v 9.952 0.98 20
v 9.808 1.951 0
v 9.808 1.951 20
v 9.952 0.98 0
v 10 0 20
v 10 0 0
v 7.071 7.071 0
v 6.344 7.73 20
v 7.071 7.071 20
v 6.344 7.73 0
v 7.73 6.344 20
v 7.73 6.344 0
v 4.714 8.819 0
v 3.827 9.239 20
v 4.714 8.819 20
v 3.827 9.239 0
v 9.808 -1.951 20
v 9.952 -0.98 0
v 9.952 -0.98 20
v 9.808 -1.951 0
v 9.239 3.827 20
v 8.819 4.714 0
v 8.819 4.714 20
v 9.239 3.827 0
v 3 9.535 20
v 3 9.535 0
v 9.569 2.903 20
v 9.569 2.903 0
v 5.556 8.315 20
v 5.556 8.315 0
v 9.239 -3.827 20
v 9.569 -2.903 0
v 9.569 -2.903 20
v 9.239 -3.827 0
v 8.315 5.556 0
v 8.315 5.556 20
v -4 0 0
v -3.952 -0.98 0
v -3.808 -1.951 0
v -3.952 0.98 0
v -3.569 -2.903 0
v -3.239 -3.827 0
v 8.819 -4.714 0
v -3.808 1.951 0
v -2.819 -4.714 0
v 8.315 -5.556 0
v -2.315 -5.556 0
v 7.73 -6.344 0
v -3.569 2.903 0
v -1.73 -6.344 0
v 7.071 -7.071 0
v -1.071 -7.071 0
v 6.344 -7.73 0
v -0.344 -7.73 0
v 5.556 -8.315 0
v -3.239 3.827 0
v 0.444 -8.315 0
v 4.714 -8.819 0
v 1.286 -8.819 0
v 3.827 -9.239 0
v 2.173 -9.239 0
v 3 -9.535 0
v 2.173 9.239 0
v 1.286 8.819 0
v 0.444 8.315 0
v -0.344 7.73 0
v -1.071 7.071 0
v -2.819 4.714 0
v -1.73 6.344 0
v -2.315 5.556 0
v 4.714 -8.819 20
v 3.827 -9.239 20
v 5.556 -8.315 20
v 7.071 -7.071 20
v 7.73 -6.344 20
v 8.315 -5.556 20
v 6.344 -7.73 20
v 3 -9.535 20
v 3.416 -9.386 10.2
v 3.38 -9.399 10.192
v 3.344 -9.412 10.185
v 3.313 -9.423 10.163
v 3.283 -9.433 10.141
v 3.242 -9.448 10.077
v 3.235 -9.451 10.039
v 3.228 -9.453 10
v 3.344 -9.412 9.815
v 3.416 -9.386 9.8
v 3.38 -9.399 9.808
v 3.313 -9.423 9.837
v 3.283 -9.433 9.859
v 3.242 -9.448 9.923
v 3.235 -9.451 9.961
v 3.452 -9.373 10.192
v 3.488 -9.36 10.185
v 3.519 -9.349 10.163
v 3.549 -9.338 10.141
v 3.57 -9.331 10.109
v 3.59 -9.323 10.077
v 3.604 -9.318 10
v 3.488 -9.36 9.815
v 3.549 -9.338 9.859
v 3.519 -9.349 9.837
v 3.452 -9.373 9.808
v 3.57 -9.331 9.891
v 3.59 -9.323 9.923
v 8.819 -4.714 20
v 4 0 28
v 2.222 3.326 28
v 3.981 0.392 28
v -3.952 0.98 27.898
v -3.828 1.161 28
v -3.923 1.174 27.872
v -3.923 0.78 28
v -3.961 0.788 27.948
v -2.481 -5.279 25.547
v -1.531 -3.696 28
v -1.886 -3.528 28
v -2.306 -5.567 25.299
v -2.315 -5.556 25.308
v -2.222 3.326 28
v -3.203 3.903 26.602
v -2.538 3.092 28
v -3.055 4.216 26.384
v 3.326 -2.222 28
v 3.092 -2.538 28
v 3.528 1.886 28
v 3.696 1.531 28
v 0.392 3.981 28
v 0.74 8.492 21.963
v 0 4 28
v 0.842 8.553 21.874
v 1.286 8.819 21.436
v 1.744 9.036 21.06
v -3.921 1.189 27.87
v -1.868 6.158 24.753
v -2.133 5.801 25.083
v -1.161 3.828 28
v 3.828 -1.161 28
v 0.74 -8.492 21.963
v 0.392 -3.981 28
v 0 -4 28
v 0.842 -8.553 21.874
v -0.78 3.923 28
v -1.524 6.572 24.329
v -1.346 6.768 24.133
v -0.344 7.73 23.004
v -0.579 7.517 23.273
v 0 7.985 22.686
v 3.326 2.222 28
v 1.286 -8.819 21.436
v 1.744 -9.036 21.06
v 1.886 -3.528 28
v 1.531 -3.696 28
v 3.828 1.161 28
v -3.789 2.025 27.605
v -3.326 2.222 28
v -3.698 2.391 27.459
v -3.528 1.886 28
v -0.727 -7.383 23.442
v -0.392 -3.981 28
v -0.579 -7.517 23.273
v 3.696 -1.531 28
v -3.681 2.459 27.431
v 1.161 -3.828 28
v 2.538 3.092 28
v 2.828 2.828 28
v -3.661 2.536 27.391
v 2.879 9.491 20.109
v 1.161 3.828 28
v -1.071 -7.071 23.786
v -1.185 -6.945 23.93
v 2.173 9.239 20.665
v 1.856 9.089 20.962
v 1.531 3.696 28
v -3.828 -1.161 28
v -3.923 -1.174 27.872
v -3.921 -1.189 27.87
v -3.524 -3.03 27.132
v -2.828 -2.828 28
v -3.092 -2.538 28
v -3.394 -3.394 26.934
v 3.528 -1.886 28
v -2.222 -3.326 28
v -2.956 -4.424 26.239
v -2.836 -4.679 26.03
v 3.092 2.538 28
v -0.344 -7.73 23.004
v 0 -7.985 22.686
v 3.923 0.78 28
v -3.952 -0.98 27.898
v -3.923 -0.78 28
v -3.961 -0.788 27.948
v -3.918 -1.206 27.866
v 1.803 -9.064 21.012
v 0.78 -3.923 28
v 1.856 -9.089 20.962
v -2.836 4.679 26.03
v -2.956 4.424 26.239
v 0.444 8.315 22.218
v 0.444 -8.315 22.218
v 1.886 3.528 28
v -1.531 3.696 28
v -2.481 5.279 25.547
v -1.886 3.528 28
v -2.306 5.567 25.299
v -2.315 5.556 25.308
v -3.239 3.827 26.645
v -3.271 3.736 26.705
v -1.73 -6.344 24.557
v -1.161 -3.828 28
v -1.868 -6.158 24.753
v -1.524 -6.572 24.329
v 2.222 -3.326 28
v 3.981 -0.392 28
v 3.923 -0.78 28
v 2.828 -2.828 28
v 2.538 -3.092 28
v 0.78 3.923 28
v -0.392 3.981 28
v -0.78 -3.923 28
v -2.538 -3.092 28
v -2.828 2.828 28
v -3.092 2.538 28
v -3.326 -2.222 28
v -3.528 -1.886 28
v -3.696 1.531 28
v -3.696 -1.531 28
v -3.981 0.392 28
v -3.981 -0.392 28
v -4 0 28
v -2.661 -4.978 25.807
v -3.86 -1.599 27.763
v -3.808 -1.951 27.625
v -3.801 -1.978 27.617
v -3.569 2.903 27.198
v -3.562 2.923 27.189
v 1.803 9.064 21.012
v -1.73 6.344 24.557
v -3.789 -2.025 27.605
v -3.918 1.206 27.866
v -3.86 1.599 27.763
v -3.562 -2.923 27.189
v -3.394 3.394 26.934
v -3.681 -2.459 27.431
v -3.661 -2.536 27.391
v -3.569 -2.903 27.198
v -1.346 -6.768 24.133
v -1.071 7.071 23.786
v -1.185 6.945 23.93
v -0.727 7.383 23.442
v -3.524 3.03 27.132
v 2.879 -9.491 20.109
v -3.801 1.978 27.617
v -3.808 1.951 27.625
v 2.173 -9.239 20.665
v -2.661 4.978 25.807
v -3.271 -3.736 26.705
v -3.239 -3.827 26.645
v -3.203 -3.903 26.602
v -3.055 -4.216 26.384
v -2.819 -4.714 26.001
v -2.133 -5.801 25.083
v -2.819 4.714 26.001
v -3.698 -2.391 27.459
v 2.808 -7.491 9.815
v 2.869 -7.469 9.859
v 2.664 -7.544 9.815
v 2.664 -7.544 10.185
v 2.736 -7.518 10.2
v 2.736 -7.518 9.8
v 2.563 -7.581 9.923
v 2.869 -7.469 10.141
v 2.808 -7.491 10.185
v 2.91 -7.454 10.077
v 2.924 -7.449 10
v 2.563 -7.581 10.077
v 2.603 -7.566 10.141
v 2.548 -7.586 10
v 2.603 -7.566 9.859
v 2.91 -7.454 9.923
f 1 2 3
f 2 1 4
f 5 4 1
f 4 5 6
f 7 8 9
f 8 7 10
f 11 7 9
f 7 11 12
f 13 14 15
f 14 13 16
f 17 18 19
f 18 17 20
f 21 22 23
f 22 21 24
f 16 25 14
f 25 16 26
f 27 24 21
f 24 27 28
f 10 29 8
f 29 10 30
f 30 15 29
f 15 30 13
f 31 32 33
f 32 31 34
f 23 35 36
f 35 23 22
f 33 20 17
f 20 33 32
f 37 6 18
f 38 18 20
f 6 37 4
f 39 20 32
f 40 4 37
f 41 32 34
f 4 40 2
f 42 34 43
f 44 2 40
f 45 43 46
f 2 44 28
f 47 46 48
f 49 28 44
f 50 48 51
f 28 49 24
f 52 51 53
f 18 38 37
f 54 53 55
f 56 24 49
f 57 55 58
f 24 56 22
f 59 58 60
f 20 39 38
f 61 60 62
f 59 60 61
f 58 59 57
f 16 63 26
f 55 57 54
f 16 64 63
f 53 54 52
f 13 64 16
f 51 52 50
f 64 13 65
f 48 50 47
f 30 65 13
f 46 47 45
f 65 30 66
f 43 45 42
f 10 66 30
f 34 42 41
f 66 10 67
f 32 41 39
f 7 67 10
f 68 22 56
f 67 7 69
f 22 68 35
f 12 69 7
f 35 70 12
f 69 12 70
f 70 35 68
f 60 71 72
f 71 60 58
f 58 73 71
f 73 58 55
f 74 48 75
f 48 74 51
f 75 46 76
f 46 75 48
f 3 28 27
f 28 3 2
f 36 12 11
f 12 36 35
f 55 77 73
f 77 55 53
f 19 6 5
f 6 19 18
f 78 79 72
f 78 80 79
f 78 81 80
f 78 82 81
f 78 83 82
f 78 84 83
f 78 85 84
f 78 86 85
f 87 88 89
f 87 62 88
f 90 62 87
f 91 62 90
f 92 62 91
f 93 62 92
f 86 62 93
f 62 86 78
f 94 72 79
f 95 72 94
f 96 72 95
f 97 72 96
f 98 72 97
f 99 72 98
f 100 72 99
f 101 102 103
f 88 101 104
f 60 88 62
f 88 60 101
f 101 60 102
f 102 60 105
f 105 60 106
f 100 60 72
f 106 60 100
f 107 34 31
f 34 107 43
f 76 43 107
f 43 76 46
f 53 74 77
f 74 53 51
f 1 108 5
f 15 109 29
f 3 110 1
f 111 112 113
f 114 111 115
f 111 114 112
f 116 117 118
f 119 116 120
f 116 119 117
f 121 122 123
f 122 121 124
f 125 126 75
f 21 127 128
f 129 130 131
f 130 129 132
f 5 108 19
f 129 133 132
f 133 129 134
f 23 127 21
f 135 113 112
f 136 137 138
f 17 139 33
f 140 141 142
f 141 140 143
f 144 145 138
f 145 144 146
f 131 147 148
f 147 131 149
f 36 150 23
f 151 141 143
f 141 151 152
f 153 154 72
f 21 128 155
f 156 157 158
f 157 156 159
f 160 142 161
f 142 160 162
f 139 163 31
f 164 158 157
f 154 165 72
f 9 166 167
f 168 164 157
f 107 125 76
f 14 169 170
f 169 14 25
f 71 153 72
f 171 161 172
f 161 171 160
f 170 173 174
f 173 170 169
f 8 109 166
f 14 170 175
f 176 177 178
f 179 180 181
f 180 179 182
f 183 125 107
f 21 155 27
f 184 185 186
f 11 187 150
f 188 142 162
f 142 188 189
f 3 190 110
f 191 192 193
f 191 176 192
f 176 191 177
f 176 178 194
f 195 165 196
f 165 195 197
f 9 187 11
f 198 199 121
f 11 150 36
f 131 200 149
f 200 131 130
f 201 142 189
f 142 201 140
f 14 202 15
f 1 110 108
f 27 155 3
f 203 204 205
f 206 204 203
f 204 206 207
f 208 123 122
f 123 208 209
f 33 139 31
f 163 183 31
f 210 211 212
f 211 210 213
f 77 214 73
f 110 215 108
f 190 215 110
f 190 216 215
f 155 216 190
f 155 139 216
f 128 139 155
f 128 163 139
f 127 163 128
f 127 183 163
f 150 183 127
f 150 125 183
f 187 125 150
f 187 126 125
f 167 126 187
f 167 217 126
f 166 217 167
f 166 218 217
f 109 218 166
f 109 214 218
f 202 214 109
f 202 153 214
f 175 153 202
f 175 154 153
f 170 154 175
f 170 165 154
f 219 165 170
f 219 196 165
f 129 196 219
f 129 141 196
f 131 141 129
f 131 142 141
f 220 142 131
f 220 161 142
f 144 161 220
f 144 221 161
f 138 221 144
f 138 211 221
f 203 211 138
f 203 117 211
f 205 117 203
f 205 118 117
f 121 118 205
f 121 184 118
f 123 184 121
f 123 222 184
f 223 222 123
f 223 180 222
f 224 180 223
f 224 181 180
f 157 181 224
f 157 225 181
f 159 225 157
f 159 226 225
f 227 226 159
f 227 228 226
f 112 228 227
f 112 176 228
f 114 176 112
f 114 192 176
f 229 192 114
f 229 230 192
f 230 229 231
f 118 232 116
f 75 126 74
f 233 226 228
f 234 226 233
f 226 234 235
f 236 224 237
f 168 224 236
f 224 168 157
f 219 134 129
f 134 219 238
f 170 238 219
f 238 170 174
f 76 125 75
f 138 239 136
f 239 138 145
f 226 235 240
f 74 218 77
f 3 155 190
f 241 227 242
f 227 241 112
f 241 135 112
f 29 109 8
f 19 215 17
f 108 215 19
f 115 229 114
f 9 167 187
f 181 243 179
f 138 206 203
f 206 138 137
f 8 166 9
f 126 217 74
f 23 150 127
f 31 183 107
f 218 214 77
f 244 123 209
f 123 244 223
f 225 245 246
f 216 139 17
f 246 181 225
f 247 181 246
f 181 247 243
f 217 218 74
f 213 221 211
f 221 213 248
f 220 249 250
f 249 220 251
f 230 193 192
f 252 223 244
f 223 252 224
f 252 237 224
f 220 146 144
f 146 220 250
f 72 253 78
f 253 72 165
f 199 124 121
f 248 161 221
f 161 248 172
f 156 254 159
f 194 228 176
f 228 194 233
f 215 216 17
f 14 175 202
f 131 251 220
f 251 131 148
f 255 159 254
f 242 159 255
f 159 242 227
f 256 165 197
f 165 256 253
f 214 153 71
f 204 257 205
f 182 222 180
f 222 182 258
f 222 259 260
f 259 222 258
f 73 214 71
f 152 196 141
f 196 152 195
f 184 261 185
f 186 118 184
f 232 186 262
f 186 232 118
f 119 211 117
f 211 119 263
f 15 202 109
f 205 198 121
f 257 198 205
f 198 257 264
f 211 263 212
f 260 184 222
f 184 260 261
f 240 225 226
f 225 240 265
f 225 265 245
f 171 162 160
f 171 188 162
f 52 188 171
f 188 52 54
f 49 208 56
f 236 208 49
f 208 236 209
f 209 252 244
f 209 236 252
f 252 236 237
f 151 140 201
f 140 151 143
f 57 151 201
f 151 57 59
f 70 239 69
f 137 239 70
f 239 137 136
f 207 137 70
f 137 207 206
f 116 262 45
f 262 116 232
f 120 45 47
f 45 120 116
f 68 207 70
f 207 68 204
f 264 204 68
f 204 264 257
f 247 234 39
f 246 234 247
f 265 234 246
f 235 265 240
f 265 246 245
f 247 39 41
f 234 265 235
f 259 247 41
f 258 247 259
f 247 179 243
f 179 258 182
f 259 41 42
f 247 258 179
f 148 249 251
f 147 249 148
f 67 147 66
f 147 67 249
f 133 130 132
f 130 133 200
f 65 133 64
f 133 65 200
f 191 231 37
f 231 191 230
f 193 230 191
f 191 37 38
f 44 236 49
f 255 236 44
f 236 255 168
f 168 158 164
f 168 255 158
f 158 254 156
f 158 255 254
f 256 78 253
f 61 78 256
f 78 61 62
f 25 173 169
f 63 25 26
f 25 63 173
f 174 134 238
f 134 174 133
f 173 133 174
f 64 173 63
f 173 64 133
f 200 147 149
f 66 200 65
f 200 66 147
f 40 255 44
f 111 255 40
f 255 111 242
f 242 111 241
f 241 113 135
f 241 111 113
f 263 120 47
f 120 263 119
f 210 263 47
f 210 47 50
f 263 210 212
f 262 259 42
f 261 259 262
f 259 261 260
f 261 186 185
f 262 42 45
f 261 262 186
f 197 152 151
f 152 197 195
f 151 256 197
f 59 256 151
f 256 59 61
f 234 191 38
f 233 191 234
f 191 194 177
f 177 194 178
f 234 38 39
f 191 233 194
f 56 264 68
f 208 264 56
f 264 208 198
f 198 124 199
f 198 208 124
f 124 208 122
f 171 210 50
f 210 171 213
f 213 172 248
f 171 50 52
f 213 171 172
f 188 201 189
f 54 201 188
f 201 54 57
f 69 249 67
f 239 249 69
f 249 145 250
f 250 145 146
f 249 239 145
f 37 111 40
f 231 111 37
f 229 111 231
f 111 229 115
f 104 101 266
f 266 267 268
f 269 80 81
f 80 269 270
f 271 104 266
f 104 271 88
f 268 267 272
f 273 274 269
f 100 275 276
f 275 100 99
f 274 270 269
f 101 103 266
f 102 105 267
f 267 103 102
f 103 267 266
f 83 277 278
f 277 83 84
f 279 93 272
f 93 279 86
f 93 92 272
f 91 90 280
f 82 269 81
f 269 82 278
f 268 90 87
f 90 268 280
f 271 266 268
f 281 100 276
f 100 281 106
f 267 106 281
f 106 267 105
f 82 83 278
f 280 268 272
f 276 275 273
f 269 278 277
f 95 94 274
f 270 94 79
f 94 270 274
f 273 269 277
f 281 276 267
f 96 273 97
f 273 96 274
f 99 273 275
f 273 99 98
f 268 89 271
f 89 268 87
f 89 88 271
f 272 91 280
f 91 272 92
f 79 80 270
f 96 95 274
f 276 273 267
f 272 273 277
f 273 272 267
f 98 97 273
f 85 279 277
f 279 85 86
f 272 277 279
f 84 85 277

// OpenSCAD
// A hole in a face the corner placement fans into triangles.
//
// step-cap-meets-wall's part, with a blind bore of radius 0.2 drilled radially
// into its first cylinder at 70 degrees below the x axis. The 64-gon's facet
// there - between -73.125 and -67.5 degrees - straddles the line where the
// second cylinder's wall crosses the first one's (x = 3, y = -9.5394), so it is
// one of the two facets no cylinder face takes; its junction corners move onto
// that crossing and bend it, and it is written as triangles on the planes their
// corners are on. The bore puts a hole in it.
//
// The hole was fanned twice (open item 39, R24). The corner placement judged
// every valid loop as a face, holes included: the bore's ring, bent by the same
// moves, was fanned into fourteen triangles of its own, covering the hole a
// second time against the face whose triangles already bound it - every edge of
// the ring used twice the same way, seventeen breaks of the B-rep's contract, a
// shell no kernel reads as the solid. A hole is a bound of its face, and is
// judged with it.
//
// And the ring was read as a facet (R25). Named for the first cylinder, as its
// face is, and lying on the bore that cut it, it was reported as a facet whose
// position contradicts its name, in both tiers - a ring lies on whatever cut it,
// and that says nothing about the surface of the face it bounds.
//
// The volume is step-cap-meets-wall's bracket less the bore, each end of it by
// its own rule. The smooth solid loses the circular bore from radius 8 to the
// cylinder r = 10: the integral over the disc of sqrt(100 - y^2) - 8, which is
// 2 pi r^2 - pi r^4 / 80 = 0.2512646. The mesh loses the 16-gon's prism, area
// 8 r^2 sin(pi/8) = 0.1224587, from radius 8 to the facet's plane, which is
// 10 cos(pi/64) from the axis and tilted 0.3125 degrees from square to the
// bore, so 10 cos(pi/64) / cos(0.3125 deg) = 9.9881031 along it at the
// section's centroid: 0.2434605. So 4891.296892 - 0.2512646 = 4891.045627 and
// 4881.063273 - 0.2434605 = 4880.819812, and the export lies between.
//
// VOLUME: 4885.932720 +/- 5.112907
// VOLUME-APPROX: 4885.932720 +/- 5.112907
//
// The known defects of step-cap-meets-wall, which this part carries unchanged:
// a D0 region left to the tessellation at the exact tier, and facets named by
// their maker for a declared surface not written on it (open item 34). Tolerated
// by name; the test fails the day either is no longer raised.
// KNOWN-EXPORT-ERROR: of a D0 region are left to the tessellation
// KNOWN-EXPORT-ERROR: facets named by their maker for a declared surface are not written on it

$fn = 64;
difference() {
  intersection() {
    union() {
      cylinder(r = 10, h = 20);
      translate([0, 0, 20]) cylinder(r1 = 10, r2 = 4, h = 8);
    }
    translate([6, 0, -1]) cylinder(r = 10, h = 40);
  }
  rotate([0, 0, -70]) translate([8, 0, 10]) rotate([0, 90, 0]) cylinder(r = 0.2, h = 4, $fn = 16);
}
